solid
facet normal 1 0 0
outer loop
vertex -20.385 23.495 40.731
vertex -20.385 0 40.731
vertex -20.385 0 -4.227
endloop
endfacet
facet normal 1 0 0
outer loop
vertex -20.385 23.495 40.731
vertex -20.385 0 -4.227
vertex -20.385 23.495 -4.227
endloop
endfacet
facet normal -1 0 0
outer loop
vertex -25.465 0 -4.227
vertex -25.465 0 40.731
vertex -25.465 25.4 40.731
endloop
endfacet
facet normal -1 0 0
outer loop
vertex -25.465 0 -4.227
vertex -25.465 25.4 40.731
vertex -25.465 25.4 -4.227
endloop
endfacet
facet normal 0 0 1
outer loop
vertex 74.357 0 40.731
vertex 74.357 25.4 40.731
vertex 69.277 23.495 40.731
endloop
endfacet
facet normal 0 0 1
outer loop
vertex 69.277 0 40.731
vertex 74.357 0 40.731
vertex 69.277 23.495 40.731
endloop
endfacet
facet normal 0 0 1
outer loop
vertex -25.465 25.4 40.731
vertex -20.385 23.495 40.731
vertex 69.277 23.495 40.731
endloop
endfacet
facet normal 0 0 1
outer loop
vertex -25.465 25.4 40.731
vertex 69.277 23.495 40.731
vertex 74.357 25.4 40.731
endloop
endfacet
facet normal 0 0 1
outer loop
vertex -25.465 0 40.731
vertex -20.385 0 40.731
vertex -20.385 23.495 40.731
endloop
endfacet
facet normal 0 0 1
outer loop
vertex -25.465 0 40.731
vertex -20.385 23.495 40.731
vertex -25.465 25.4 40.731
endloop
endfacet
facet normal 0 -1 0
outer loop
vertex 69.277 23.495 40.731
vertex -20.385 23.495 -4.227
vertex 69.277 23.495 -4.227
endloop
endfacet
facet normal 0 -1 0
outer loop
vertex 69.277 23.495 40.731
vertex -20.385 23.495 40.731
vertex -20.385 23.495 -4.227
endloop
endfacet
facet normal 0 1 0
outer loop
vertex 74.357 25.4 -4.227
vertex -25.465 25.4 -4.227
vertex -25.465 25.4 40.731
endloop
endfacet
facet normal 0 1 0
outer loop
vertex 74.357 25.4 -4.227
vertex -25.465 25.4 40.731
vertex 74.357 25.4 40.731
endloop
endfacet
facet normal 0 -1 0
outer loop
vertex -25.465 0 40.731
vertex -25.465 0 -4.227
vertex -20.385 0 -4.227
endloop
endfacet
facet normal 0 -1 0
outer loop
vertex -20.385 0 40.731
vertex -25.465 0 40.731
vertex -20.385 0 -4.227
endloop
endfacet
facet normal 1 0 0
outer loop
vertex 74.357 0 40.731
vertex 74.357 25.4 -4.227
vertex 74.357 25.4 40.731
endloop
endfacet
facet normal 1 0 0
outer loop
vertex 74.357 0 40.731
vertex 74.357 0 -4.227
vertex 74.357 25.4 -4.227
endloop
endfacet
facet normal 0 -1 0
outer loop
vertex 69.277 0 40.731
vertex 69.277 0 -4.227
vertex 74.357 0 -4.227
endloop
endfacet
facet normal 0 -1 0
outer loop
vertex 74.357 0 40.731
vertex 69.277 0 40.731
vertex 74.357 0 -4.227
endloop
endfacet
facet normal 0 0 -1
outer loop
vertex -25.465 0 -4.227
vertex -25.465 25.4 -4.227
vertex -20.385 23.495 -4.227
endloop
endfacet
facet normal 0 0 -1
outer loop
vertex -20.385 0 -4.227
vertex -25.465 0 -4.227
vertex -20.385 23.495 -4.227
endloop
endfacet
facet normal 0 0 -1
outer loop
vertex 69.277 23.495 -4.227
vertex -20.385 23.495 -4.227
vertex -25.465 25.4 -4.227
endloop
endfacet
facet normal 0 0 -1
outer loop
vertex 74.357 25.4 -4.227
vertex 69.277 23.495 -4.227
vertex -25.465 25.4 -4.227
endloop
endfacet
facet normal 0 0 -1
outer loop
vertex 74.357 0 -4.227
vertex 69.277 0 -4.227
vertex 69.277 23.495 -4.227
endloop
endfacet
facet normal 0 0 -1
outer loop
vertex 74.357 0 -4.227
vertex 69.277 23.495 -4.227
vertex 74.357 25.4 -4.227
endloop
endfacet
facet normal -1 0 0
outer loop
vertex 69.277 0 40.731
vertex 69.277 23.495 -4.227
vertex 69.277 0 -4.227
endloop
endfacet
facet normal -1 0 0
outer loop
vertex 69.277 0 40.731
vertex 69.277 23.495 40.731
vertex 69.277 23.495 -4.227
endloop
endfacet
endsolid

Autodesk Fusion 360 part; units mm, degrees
sketch "Sketch1" plane through (0, 0, 0) normal (0, 1, 0) x (1, 0, 0)
  line L0 (-25.4646, 4.2269) -> (74.3574, 4.2269)
  line L1 (74.3574, 4.2269) -> (74.3574, -40.7311)
  line L2 (74.3574, -40.7311) -> (-25.4646, -40.7311)
  line L3 (-25.4646, -40.7311) -> (-25.4646, 4.2269)
  dimension "d1" = 99.822
  dimension "d2" = 44.958
extrude "Extrude1" add sketch "Sketch1" along normal blind 25.4
sketch "Sketch2" plane through (0, 0, 40.7311) normal (0, 0, 1) x (1, 0, 0)
  line L0 (-25.4646, 0) -> (74.3574, 0)
  line L1 (74.3574, 0) -> (74.3574, 25.4)
  line L2 (74.3574, 25.4) -> (-25.4646, 25.4)
  line L3 (-25.4646, 25.4) -> (-25.4646, 0)
  line L4 (-20.3846, 23.495) -> (69.2774, 23.495)
  line L5 (69.2774, 23.495) -> (69.2774, 0)
  line L6 (69.2774, 0) -> (-20.3846, 0)
  line L7 (-20.3846, 0) -> (-20.3846, 23.495)
  dimension "d5" = 5.08
  dimension "d6" = 5.08
  dimension "d7" = 1.905
extrude "Extrude2" cut sketch "Sketch2" against normal blind 66.04 contours L0 L4 L5 L6 L7
